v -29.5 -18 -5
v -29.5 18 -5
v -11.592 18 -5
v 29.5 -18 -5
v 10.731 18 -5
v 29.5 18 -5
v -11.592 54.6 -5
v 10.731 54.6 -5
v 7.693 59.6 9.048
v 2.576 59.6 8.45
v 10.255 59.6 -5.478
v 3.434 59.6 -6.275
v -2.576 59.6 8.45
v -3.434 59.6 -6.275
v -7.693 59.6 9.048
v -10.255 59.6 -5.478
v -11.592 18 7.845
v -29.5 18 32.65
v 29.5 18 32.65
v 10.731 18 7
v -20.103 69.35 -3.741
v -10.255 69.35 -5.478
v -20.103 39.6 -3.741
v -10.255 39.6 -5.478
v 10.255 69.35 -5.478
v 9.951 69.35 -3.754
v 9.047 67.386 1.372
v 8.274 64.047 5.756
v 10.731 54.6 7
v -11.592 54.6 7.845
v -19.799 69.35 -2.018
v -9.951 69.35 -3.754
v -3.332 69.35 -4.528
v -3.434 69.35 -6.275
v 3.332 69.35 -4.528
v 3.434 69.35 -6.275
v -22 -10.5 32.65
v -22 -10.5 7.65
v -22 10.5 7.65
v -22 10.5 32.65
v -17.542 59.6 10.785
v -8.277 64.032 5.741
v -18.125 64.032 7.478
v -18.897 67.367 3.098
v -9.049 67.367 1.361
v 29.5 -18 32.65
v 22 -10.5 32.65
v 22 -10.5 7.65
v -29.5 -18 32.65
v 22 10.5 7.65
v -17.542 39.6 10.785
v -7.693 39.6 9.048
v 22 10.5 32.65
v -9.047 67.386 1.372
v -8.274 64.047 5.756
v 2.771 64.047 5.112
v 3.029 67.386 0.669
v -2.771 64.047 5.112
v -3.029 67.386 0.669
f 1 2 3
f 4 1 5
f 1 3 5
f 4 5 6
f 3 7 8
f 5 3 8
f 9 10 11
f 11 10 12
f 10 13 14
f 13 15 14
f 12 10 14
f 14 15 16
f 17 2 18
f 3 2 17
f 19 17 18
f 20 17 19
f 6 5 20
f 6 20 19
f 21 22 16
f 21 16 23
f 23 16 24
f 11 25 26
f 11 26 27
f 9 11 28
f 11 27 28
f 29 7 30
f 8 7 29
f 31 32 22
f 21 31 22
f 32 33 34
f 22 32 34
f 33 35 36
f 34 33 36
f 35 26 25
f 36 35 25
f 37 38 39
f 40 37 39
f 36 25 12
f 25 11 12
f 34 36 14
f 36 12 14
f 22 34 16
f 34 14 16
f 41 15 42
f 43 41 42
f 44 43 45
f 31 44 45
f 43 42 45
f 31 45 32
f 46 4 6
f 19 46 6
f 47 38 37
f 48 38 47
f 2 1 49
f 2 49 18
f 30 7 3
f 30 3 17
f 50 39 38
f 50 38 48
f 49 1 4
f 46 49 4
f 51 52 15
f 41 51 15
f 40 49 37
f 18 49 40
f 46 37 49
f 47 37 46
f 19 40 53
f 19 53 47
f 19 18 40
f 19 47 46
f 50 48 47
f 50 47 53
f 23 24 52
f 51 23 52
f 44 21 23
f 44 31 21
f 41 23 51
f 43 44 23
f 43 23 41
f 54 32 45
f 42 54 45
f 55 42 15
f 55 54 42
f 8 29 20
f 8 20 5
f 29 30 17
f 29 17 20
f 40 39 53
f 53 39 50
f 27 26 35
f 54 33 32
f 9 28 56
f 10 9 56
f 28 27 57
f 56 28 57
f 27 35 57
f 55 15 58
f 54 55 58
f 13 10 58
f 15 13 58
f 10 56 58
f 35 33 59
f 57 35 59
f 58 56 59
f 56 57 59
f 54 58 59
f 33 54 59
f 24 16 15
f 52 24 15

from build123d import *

# Parameters (mm, degrees)
SKETCH1_W           = 59
SKETCH1_H           = 36
SKETCH1_W_2         = 44
SKETCH1_H_2         = 21
BOSS_EXTRUDE1_DEPTH = 10
SKETCH1_2_W         = 59
SKETCH1_2_H         = 36
SKETCH1_2_W_2       = 44
SKETCH1_2_H_2       = 21
BOSS_EXTRUDE2_DEPTH = 5
BOSS_EXTRUDE3_DEPTH = 36.6
REVOLVE1_ANGLE      = 20
BOSS_EXTRUDE4_DEPTH = 10
SKETCH1_5_W         = 44
SKETCH1_5_H         = 21
BOSS_EXTRUDE6_DEPTH = 7.65
BOSS_EXTRUDE7_START = 7.65
SKETCH1_6_W         = 59
SKETCH1_6_H         = 36
SKETCH1_6_W_2       = 44
SKETCH1_6_H_2       = 21
BOSS_EXTRUDE7_DEPTH = 25


with BuildPart() as part:
    # Sketch1 → Boss-Extrude1 (new body)
    with BuildSketch(Plane.XY):
        Rectangle(SKETCH1_W, SKETCH1_H)
        Rectangle(SKETCH1_W_2, SKETCH1_H_2, mode=Mode.SUBTRACT)
    extrude(amount=BOSS_EXTRUDE1_DEPTH)

    # Sketch1<2> → Boss-Extrude2 (add)
    # profile 1 of 2: a face of its own
    with BuildSketch(Plane.XY):
        Rectangle(SKETCH1_2_W, SKETCH1_2_H)
        Rectangle(SKETCH1_2_W_2, SKETCH1_2_H_2, mode=Mode.SUBTRACT)
    # profile 2 of 2: a face of its own
    with BuildSketch(Plane.XY):
        Rectangle(SKETCH1_2_W_2, SKETCH1_2_H_2)
    extrude(amount=-BOSS_EXTRUDE2_DEPTH)

    # Sketch4 → Boss-Extrude3 (add)
    with BuildSketch(Plane(origin=(0, 18, 0), x_dir=(1, 0, 0), z_dir=(0, 1, 0))):
        Polygon((-11.59160023, 5), (-11.59160023, -7.844664049), (10.731401476, -7), (10.731401476, 5), align=None)
    extrude(amount=BOSS_EXTRUDE3_DEPTH)

    # Sketch1<5> → Boss-Extrude6 (add)
    with BuildSketch(Plane.XY):
        Rectangle(SKETCH1_5_W, SKETCH1_5_H)
    extrude(amount=BOSS_EXTRUDE6_DEPTH)

    # Sketch1<6> → Boss-Extrude7 (add)
    with BuildSketch(Plane.XY.offset(BOSS_EXTRUDE7_START)):
        Rectangle(SKETCH1_6_W, SKETCH1_6_H)
        Rectangle(SKETCH1_6_W_2, SKETCH1_6_H_2, mode=Mode.SUBTRACT)
    extrude(amount=BOSS_EXTRUDE7_DEPTH)


with BuildPart() as body_2:
    # Sketch6 → Revolve1 (revolve, symmetric)
    with BuildSketch(Plane(origin=(0, 0, 0), x_dir=(0, 0, -1), z_dir=(1, 0, 0))) as revolve1_sk:
        with BuildLine():
            Line((6.375, 59.6), (-8.375, 59.6))
            ThreePointArc((-8.375, 59.6), (-2.924218778, 65.873958371), (4.625, 69.35))
            Line((4.625, 69.35), (6.375, 69.35))
            Line((6.375, 69.35), (6.375, 59.6))
        make_face()
    revolve(axis=Axis((0, 146.671144668, 52.68), (0, -1, 0)), revolution_arc=REVOLVE1_ANGLE / 2)
    revolve(revolve1_sk.sketch, axis=Axis((0, 146.671144668, 52.68), (0, 1, 0)), revolution_arc=REVOLVE1_ANGLE / 2)

    # Sketch8 → Boss-Extrude4 (add)
    with BuildSketch(Plane(origin=(-9.008810575, 0, 1.588496368), x_dir=(0.17364817766693072, 0, 0.9848077530122081), z_dir=(-0.9848077530122081, 0, 0.17364817766693072))):
        with BuildLine():
            Line((-7.175327571, 69.35), (-7.175327571, 59.6))
            Line((-7.175327571, 59.6), (-7.175327571, 39.6))
            Line((-7.175327571, 39.6), (7.574672429, 39.6))
            Line((7.574672429, 39.6), (7.574672429, 59.6))
            ThreePointArc((7.574672429, 59.6), (2.109528791, 65.854808483), (-5.425327571, 69.35))
            Line((-5.425327571, 69.35), (-7.175327571, 69.35))
        make_face()
    extrude(amount=BOSS_EXTRUDE4_DEPTH)


solid = Compound([part.part, body_2.part])
